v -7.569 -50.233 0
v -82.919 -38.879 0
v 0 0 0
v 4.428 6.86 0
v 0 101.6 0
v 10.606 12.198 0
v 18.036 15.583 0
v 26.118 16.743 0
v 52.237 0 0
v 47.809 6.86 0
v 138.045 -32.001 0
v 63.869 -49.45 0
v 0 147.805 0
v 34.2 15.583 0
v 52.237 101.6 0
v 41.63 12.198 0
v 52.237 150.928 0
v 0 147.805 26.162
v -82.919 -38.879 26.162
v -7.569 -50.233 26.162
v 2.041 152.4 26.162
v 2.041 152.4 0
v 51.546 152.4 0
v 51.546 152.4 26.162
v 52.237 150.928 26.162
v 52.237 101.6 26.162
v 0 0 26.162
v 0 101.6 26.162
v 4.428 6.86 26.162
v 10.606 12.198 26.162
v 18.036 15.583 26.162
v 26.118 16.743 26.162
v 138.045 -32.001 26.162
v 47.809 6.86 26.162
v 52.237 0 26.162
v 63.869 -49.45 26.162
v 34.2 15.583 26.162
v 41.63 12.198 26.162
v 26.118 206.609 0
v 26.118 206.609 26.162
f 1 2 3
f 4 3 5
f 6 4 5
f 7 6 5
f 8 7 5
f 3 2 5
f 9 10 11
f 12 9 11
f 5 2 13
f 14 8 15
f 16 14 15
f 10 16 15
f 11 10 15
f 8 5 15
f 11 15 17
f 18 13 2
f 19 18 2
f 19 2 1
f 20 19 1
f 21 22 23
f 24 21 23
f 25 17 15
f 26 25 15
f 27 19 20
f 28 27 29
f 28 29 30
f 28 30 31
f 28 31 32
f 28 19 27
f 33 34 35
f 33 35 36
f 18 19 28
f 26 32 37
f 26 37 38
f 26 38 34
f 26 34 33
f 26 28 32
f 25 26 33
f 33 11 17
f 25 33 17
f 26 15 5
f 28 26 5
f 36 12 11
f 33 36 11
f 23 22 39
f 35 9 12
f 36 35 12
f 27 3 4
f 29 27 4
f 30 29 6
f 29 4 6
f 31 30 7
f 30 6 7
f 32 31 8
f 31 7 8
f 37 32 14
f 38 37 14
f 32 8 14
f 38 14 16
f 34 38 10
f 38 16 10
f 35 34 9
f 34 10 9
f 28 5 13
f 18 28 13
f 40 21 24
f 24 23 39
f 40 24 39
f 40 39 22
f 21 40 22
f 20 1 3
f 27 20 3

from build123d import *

# Parameters (mm, degrees)
F0_W     = 52.2367432714
F0_H     = 20.7408728629
F1_DEPTH = 26.162


with BuildPart() as f1:
    # F0 (on Top) → F1 (new body)
    with BuildSketch(Plane.XY):
        Polygon((-7.5693419099, -50.2329081684), (0, 0), (0, 30.0591271371), (0, 50.8), (0, 101.6), (0, 147.8053582557), (-82.9187041624, -38.8788953036), align=None)
        Polygon((52.2367432714, 30.0591271371), (52.2367432714, 0), (63.8693667413, -49.4501978884), (138.044663574, -32.0012626835), (52.2367432714, 150.9281977383), (52.2367432714, 101.6), (52.2367432714, 50.8), align=None)
        with BuildLine():
            ThreePointArc((0, 0), (26.1183716357, 16.7427360355), (52.2367432714, 0))
            Line((52.2367432714, 0), (52.2367432714, 30.0591271371))
            Line((52.2367432714, 30.0591271371), (0, 30.0591271371))
            Line((0, 30.0591271371), (0, 0))
        make_face()
        Polygon((0, 50.8), (52.2367432714, 50.8), (26.1183716357, 76.2), align=None)
        Polygon((0, 101.6), (0, 50.8), (26.1183716357, 76.2), align=None)
        Polygon((26.1183716357, 76.2), (52.2367432714, 101.6), (0, 101.6), align=None)
        Polygon((26.1183716357, 76.2), (52.2367432714, 50.8), (52.2367432714, 101.6), align=None)
        with Locations((26.1183716357, 40.4295635685)):
            Rectangle(F0_W, F0_H)
    extrude(amount=F1_DEPTH)


with BuildPart() as f1b:
    # F0 (on Top) → F1, piece 2 (new body)
    with BuildSketch(Plane.XY):
        Polygon((2.0407813314, 152.4), (51.5463553432, 152.4), (26.1183716357, 206.6086012904), align=None)
    extrude(amount=F1_DEPTH)


solid = Compound([f1.part, f1b.part])
